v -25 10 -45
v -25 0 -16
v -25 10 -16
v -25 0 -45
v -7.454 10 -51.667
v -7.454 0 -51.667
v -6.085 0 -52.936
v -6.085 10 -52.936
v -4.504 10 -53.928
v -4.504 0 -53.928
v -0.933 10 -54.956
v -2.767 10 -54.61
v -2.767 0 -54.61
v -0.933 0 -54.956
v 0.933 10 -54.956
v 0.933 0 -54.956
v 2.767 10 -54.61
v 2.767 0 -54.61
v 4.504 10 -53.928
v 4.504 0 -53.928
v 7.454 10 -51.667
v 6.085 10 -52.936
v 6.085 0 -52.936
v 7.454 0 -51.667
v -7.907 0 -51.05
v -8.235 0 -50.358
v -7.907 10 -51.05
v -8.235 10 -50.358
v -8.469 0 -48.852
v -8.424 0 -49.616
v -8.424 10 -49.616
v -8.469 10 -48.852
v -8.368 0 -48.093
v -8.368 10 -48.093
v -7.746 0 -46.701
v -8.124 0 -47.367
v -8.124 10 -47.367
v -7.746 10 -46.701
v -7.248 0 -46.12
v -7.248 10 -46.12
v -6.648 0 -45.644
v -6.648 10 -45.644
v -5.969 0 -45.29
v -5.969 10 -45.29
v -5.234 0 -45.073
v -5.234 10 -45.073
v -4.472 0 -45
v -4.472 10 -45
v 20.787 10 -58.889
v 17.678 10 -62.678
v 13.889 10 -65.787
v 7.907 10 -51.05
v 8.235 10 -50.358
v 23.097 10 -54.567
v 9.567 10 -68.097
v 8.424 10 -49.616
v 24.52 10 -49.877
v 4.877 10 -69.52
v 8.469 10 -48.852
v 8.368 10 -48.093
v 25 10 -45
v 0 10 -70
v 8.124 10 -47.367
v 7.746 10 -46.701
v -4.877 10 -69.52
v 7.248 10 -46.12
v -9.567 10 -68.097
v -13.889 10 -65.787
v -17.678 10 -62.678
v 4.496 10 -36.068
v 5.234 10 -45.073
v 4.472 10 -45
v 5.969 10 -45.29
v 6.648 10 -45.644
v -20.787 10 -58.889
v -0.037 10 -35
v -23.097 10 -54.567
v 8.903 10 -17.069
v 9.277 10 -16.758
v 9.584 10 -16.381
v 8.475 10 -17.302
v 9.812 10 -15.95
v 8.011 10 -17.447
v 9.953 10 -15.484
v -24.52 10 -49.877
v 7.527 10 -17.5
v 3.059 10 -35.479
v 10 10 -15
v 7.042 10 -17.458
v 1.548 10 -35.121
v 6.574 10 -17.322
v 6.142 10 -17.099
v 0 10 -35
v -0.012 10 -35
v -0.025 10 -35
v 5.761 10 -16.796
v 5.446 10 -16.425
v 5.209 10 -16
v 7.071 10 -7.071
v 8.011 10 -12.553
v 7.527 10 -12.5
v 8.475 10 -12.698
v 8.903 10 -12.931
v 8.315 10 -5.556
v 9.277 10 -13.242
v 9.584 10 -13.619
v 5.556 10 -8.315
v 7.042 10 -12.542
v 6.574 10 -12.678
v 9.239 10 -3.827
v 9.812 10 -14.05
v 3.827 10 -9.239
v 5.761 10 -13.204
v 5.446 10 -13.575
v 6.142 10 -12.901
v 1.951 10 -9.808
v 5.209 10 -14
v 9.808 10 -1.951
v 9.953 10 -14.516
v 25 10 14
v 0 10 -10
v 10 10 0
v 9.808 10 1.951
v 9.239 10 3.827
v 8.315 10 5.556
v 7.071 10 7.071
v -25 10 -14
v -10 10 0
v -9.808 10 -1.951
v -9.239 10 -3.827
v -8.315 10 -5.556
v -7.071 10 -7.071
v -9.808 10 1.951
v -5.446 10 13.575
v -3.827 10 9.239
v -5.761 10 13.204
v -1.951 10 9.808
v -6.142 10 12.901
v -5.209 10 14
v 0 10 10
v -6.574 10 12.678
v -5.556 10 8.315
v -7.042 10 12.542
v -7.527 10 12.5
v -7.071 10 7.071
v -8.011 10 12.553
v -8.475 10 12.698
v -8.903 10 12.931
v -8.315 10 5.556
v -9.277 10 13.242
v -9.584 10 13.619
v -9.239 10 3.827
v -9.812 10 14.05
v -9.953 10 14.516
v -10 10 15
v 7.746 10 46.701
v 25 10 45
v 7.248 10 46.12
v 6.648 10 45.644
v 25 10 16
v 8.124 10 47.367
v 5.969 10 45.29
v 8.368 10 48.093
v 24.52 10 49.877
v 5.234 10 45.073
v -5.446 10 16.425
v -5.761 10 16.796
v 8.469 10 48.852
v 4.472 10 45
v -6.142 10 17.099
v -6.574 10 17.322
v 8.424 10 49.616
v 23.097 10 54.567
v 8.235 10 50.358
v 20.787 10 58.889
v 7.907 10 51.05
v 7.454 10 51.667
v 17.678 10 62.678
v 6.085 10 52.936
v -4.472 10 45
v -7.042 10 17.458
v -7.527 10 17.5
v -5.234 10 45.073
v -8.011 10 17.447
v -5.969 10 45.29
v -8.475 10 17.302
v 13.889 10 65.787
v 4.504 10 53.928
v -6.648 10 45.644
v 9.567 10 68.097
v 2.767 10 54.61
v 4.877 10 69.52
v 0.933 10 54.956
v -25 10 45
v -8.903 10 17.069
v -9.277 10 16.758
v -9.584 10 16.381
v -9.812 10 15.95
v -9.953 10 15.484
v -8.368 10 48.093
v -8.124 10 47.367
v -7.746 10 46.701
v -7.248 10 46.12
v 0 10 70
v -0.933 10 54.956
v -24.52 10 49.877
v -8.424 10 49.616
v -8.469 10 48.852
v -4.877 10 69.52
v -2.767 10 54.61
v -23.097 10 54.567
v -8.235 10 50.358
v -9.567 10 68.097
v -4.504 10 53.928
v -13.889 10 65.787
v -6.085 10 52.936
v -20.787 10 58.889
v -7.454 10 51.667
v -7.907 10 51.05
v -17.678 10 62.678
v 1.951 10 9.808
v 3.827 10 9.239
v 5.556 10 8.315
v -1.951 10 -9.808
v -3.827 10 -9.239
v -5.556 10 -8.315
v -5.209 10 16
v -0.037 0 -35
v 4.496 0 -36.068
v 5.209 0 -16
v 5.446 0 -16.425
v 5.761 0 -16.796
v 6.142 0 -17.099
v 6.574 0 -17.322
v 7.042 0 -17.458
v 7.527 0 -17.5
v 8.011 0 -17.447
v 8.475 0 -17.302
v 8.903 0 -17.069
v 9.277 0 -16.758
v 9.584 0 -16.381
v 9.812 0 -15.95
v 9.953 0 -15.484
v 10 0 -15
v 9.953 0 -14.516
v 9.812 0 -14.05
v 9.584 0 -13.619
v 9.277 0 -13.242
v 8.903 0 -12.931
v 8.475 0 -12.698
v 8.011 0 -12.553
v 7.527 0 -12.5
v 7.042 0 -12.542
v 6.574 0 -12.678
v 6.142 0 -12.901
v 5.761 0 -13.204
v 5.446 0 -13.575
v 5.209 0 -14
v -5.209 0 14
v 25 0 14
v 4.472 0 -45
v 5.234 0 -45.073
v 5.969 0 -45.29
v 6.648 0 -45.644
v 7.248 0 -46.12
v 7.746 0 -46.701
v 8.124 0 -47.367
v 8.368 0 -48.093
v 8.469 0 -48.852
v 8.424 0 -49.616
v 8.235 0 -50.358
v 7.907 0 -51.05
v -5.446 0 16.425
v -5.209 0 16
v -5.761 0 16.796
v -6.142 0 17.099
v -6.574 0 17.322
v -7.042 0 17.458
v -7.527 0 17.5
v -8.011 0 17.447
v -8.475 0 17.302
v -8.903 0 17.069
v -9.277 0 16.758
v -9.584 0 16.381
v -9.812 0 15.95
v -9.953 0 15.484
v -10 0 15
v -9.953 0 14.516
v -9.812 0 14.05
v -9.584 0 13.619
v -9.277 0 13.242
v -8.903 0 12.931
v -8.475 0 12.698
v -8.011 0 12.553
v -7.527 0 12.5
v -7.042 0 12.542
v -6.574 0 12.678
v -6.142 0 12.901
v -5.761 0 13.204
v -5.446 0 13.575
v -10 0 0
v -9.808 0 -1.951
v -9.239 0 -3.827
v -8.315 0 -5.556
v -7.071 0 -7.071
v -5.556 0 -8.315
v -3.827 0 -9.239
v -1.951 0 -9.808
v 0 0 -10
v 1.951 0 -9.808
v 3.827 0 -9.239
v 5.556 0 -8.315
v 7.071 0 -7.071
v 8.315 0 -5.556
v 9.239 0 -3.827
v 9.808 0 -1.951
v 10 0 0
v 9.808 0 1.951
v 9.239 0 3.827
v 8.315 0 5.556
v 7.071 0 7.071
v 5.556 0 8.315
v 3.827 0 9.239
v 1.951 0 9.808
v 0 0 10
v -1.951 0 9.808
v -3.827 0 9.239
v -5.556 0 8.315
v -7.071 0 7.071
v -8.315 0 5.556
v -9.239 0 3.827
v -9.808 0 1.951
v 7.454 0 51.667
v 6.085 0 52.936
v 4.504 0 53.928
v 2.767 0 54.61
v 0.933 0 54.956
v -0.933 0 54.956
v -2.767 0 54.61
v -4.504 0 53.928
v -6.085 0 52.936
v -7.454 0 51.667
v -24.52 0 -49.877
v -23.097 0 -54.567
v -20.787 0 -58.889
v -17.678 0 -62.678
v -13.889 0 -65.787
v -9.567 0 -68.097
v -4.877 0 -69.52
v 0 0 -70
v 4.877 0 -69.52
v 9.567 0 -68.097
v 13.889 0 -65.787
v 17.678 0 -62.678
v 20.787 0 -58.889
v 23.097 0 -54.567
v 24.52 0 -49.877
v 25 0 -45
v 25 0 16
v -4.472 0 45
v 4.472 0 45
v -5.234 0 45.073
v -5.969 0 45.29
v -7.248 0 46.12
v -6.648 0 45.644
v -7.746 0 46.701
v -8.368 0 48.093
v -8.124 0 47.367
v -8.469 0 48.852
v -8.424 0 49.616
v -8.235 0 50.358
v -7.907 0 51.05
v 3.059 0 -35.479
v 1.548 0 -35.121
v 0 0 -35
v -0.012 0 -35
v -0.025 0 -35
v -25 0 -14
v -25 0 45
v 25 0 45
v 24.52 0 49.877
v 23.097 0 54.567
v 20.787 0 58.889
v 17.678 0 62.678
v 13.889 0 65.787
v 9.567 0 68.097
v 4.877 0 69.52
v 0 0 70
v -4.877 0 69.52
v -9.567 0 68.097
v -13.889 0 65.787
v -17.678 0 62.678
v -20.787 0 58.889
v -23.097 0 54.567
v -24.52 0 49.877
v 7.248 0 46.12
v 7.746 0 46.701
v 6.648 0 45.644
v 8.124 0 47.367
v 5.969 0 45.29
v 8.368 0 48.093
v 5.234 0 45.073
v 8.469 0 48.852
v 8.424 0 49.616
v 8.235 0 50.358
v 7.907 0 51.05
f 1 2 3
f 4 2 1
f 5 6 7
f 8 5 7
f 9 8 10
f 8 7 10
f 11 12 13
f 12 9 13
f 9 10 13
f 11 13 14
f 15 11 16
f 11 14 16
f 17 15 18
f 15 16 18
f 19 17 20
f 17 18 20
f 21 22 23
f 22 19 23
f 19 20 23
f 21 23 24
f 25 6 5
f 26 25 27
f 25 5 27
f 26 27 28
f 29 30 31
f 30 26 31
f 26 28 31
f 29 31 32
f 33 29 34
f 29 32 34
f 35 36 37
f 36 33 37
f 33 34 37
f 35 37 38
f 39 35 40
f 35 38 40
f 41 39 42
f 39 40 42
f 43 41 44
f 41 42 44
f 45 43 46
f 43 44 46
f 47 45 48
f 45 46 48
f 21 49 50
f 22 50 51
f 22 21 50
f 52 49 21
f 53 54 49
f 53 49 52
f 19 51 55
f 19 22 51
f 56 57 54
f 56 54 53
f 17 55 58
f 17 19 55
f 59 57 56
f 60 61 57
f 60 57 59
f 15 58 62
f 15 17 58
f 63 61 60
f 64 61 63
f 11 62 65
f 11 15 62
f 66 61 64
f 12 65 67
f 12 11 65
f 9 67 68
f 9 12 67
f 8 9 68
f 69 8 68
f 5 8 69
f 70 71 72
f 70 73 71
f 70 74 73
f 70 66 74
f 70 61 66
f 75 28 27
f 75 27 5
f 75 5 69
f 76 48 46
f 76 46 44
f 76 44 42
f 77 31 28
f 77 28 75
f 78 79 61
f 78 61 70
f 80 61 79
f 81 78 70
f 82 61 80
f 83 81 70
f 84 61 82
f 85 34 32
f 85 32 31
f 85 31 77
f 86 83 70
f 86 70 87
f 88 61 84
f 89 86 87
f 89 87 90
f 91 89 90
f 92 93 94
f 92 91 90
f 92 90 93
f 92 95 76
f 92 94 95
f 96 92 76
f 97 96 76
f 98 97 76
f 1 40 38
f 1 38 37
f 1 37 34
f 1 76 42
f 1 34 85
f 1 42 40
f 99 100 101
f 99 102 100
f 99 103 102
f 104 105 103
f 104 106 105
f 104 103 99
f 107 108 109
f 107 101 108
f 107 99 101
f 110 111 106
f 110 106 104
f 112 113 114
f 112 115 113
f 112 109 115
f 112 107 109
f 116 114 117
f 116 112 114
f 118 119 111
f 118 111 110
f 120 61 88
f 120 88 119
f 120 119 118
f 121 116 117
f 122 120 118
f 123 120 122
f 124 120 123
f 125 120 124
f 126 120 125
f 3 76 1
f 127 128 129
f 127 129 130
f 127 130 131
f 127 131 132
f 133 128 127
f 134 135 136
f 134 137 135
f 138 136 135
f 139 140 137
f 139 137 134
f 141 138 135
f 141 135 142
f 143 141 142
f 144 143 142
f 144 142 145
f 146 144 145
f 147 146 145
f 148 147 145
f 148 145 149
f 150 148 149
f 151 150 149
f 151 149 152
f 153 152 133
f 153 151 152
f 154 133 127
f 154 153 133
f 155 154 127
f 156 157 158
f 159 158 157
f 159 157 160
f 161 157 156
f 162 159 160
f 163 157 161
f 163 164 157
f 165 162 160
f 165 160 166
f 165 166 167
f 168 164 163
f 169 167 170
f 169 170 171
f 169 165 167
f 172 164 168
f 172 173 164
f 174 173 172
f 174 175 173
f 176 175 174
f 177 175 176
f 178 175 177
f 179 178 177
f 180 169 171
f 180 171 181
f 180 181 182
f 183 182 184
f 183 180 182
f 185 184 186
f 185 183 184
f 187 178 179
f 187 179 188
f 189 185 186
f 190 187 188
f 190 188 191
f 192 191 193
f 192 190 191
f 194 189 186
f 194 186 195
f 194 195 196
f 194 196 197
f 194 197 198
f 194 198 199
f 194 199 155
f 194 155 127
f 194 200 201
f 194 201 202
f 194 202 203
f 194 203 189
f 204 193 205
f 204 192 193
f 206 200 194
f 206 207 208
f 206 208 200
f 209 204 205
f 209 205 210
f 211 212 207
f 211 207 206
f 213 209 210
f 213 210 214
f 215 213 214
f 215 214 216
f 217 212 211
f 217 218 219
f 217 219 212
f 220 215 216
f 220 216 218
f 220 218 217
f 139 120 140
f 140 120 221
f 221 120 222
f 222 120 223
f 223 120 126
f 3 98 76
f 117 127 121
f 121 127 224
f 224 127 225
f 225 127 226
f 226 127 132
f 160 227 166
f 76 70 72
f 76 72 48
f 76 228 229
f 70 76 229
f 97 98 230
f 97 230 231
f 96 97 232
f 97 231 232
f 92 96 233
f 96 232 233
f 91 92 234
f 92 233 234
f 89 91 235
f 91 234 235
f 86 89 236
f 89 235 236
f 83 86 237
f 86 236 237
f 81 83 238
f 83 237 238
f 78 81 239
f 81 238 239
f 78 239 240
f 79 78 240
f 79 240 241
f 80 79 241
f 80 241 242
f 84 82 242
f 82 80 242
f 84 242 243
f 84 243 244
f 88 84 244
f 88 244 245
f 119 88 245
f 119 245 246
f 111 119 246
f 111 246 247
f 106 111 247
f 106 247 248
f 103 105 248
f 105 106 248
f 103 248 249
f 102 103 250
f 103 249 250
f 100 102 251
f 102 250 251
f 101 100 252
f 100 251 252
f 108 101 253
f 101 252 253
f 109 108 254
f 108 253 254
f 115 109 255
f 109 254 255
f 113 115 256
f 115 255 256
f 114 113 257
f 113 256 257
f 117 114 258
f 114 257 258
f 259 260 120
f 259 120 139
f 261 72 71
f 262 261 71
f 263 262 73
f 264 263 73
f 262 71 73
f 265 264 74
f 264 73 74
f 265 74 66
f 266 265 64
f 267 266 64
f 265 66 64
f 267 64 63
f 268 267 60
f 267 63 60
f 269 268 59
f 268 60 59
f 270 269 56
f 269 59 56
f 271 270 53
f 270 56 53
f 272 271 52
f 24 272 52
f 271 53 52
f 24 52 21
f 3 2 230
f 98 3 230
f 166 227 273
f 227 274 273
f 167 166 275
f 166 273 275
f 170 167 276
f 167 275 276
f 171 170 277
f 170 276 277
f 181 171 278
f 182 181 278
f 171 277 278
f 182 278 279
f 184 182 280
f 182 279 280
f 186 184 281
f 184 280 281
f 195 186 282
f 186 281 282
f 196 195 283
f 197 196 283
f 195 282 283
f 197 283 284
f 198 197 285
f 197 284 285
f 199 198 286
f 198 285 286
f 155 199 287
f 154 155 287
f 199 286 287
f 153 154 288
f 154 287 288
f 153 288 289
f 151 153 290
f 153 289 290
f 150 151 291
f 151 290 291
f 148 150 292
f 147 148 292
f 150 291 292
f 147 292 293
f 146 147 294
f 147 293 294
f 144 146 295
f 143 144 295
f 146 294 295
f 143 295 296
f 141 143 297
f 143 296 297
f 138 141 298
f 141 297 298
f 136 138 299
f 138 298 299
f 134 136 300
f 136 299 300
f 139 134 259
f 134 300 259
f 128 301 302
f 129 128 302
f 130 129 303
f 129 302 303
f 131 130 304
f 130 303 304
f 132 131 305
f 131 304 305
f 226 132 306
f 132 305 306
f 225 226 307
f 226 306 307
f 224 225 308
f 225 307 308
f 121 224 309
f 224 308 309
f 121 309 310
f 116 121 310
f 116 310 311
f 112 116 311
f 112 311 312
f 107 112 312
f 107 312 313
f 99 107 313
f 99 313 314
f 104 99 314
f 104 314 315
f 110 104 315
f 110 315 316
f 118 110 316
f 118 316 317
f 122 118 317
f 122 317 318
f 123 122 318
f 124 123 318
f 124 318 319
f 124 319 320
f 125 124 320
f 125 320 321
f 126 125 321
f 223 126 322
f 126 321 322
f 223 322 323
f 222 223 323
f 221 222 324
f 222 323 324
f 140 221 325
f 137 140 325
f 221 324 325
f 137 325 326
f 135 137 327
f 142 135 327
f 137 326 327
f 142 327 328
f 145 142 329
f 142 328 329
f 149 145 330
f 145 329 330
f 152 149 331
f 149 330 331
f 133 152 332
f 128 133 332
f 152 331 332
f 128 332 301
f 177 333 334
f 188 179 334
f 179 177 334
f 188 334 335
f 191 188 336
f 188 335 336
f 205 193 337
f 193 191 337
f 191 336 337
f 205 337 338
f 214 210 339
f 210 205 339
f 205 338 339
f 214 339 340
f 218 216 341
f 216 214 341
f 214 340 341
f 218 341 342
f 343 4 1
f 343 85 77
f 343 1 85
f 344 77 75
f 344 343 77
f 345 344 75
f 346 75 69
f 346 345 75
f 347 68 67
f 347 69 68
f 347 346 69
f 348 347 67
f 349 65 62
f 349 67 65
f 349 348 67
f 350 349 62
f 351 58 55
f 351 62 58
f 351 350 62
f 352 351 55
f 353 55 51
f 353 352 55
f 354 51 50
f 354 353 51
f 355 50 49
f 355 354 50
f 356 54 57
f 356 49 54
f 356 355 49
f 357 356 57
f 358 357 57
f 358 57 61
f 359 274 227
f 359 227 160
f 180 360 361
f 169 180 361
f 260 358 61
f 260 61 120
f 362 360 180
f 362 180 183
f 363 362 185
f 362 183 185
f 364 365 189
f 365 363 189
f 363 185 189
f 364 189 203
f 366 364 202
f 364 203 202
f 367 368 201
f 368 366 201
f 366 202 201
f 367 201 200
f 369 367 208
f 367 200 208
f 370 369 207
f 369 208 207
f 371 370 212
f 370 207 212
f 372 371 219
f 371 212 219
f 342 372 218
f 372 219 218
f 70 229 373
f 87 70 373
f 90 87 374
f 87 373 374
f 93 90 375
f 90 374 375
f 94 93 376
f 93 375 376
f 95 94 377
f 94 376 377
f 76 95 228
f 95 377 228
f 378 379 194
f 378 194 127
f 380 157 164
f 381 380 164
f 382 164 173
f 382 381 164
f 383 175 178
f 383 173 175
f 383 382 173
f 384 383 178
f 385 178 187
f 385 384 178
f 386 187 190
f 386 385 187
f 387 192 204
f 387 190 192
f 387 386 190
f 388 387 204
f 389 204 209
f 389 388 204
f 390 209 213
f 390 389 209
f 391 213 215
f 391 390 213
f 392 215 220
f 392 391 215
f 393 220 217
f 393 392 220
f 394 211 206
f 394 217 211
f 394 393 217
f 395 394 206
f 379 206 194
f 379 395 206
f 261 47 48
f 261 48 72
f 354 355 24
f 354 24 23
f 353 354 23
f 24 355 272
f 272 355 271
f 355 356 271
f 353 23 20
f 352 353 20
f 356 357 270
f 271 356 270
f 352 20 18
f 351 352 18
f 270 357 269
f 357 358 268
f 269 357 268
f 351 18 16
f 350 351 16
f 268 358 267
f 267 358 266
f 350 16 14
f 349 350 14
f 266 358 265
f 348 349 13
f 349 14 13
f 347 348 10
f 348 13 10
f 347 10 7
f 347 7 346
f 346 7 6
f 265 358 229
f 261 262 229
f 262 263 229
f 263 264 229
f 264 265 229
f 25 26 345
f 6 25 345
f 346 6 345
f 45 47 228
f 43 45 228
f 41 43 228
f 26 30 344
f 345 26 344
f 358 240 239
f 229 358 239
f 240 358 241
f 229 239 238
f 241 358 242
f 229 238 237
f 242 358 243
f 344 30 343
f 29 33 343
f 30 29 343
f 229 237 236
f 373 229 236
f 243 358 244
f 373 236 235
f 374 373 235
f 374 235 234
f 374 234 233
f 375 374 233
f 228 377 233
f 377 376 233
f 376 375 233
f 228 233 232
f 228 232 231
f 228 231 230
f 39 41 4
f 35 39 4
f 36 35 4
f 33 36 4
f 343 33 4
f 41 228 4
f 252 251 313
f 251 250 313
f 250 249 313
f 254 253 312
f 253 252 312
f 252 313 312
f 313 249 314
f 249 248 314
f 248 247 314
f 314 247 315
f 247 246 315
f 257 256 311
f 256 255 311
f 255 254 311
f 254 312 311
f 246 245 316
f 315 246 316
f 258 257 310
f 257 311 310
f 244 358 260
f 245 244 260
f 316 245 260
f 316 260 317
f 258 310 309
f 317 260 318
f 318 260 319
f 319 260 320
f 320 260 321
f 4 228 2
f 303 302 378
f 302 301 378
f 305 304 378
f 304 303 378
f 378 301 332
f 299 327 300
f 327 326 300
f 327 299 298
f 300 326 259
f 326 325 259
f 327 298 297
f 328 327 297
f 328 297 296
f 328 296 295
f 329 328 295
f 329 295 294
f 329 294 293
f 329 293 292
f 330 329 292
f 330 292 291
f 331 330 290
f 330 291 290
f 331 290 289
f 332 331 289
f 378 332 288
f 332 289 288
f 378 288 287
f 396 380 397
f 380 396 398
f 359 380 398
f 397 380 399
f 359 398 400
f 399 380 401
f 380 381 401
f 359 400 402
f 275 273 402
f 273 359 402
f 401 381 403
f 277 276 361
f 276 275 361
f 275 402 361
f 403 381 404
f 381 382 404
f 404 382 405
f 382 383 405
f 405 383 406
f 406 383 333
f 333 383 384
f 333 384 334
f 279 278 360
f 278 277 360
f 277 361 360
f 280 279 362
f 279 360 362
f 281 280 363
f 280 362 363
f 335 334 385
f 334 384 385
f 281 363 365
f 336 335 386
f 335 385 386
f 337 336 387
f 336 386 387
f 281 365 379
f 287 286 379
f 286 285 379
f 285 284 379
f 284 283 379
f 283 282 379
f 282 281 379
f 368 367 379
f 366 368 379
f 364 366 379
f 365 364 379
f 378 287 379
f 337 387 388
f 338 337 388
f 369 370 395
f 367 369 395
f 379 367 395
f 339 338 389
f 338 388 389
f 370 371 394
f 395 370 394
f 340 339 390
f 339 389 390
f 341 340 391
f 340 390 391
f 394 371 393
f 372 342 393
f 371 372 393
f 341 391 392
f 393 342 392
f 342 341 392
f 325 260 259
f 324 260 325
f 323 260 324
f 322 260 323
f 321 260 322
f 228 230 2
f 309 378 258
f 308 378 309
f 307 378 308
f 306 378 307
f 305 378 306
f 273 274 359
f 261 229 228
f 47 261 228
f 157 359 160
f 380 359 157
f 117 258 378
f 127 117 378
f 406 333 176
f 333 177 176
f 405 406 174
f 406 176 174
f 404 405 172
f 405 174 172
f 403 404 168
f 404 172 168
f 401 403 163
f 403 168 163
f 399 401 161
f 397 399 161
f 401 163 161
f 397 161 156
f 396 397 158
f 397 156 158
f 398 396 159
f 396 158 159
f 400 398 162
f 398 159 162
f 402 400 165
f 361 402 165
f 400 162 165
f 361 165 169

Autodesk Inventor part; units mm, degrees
ref_plane "YZ Plane" through (0, 0, 0) normal (1, 0, 0) x (0, 1, 0)
ref_plane "XZ Plane" through (0, 0, 0) normal (0, 1, 0) x (-1, 0, 0)
ref_plane "XY Plane" through (0, 0, 0) normal (0, 0, 1) x (1, 0, 0)
sketch "Boceto1" plane through (0, 0, 0) normal (0, 1, 0) x (-1, 0, 0)
  circle A0 centre (0, -45) radius 10
  circle A1 centre (0, 45) radius 10
  line L0 (0.0371, -35.0001) -> (-0.0371, -35.0001)
  line L1 (0.0371, -35.0001) -> (-4.4959, -36.0676)
  circle A2 centre (0, -45) radius 25
  circle A3 centre (0, 45) radius 25
  line L2 (0, 89.4288) -> (0, -73.1924) construction
  line L3 (-38.8142, 0) -> (36.7218, 0) construction
  line L4 (0, 45) -> (0, -45)
  line L5 (10, 45) -> (-10, 45)
  line L6 (10, -45) -> (-10, -45)
  line L7 (25, 45) -> (25, -45)
  line L8 (-25, -45) -> (-25, 45)
  circle A4 centre (0, 0) radius 10
  circle A5 centre (7.5, 15) radius 2.5
  line L9 (-25, 14) -> (5.2087, 14)
  line L10 (5.2087, 14) -> (5.2087, 16)
  line L11 (5.2087, 16) -> (-25, 16)
  line L12 (-25, 16) -> (-25, 14)
  line L13 (-25, 14) -> (5.2087, 16) construction
  line L14 (5.2087, 14) -> (-25, 16) construction
  line L15 (10, 0) -> (10, 38.9395) construction
  circle A6 centre (-7.5, -15) radius 2.5
  line L16 (25, -16) -> (-5.2087, -16)
  line L17 (-5.2087, -16) -> (-5.2087, -14)
  line L18 (-5.2087, -14) -> (25, -14)
  line L19 (25, -14) -> (25, -16)
  line L20 (25, -16) -> (-5.2087, -14) construction
  line L21 (-5.2087, -16) -> (25, -14) construction
  line L22 (-10, 0) -> (-10, -29.6504) construction
  point P0 (0, 60)
  point P1 (0, -60)
  point P2 (-0.0332, 54.9999)
  point P3 (-0.0332, 54.9999)
  point P4 (-12.4808, 36.6795)
  point P5 (11.1803, 35)
  point P6 (-9.8956, 15)
  point P7 (-9.8956, 15)
  point P8 (-25, 15)
  point P9 (9.8956, -15)
  point P10 (9.8956, -15)
  point P11 (25, -15)
  point P12 (25, -16)
  point P13 (-5.2087, -16)
  point P14 (25, -14)
  point P15 (5.2087, 14)
  dimension "d48" = 5
  dimension "d51" = 5
  dimension "d42" = 50
  dimension "d43" = 50
  dimension "d44" = 90
  dimension "d45" = 20
  dimension "d46" = 20
  dimension "d47" = 20
  dimension "d49" = 2
  dimension "d50" = 14
  dimension "d52" = 2
  dimension "d53" = 14
extrude "Extrusión9" add sketch "Boceto1" along normal blind 10 contours L6 L4 L1 A0 | A2 | A2 L8 L9 L4 A4 L18 A6 L16 | L4 L16 L7 A2 | A0 L1 L4 L6 | L4 A4 L9 A5 L11 A3 L7 L18 | L8 A3 L4 L11 | A1 L5 L4 | L4 L5 A1 | A3
fillet "Empalme3" radius 4 4 edges at (-10, 5, -45) (10, 5, -45) (-10, 5, 45) (10, 5, 45)
properties part number "mod6" material "Aluminio 6061"
